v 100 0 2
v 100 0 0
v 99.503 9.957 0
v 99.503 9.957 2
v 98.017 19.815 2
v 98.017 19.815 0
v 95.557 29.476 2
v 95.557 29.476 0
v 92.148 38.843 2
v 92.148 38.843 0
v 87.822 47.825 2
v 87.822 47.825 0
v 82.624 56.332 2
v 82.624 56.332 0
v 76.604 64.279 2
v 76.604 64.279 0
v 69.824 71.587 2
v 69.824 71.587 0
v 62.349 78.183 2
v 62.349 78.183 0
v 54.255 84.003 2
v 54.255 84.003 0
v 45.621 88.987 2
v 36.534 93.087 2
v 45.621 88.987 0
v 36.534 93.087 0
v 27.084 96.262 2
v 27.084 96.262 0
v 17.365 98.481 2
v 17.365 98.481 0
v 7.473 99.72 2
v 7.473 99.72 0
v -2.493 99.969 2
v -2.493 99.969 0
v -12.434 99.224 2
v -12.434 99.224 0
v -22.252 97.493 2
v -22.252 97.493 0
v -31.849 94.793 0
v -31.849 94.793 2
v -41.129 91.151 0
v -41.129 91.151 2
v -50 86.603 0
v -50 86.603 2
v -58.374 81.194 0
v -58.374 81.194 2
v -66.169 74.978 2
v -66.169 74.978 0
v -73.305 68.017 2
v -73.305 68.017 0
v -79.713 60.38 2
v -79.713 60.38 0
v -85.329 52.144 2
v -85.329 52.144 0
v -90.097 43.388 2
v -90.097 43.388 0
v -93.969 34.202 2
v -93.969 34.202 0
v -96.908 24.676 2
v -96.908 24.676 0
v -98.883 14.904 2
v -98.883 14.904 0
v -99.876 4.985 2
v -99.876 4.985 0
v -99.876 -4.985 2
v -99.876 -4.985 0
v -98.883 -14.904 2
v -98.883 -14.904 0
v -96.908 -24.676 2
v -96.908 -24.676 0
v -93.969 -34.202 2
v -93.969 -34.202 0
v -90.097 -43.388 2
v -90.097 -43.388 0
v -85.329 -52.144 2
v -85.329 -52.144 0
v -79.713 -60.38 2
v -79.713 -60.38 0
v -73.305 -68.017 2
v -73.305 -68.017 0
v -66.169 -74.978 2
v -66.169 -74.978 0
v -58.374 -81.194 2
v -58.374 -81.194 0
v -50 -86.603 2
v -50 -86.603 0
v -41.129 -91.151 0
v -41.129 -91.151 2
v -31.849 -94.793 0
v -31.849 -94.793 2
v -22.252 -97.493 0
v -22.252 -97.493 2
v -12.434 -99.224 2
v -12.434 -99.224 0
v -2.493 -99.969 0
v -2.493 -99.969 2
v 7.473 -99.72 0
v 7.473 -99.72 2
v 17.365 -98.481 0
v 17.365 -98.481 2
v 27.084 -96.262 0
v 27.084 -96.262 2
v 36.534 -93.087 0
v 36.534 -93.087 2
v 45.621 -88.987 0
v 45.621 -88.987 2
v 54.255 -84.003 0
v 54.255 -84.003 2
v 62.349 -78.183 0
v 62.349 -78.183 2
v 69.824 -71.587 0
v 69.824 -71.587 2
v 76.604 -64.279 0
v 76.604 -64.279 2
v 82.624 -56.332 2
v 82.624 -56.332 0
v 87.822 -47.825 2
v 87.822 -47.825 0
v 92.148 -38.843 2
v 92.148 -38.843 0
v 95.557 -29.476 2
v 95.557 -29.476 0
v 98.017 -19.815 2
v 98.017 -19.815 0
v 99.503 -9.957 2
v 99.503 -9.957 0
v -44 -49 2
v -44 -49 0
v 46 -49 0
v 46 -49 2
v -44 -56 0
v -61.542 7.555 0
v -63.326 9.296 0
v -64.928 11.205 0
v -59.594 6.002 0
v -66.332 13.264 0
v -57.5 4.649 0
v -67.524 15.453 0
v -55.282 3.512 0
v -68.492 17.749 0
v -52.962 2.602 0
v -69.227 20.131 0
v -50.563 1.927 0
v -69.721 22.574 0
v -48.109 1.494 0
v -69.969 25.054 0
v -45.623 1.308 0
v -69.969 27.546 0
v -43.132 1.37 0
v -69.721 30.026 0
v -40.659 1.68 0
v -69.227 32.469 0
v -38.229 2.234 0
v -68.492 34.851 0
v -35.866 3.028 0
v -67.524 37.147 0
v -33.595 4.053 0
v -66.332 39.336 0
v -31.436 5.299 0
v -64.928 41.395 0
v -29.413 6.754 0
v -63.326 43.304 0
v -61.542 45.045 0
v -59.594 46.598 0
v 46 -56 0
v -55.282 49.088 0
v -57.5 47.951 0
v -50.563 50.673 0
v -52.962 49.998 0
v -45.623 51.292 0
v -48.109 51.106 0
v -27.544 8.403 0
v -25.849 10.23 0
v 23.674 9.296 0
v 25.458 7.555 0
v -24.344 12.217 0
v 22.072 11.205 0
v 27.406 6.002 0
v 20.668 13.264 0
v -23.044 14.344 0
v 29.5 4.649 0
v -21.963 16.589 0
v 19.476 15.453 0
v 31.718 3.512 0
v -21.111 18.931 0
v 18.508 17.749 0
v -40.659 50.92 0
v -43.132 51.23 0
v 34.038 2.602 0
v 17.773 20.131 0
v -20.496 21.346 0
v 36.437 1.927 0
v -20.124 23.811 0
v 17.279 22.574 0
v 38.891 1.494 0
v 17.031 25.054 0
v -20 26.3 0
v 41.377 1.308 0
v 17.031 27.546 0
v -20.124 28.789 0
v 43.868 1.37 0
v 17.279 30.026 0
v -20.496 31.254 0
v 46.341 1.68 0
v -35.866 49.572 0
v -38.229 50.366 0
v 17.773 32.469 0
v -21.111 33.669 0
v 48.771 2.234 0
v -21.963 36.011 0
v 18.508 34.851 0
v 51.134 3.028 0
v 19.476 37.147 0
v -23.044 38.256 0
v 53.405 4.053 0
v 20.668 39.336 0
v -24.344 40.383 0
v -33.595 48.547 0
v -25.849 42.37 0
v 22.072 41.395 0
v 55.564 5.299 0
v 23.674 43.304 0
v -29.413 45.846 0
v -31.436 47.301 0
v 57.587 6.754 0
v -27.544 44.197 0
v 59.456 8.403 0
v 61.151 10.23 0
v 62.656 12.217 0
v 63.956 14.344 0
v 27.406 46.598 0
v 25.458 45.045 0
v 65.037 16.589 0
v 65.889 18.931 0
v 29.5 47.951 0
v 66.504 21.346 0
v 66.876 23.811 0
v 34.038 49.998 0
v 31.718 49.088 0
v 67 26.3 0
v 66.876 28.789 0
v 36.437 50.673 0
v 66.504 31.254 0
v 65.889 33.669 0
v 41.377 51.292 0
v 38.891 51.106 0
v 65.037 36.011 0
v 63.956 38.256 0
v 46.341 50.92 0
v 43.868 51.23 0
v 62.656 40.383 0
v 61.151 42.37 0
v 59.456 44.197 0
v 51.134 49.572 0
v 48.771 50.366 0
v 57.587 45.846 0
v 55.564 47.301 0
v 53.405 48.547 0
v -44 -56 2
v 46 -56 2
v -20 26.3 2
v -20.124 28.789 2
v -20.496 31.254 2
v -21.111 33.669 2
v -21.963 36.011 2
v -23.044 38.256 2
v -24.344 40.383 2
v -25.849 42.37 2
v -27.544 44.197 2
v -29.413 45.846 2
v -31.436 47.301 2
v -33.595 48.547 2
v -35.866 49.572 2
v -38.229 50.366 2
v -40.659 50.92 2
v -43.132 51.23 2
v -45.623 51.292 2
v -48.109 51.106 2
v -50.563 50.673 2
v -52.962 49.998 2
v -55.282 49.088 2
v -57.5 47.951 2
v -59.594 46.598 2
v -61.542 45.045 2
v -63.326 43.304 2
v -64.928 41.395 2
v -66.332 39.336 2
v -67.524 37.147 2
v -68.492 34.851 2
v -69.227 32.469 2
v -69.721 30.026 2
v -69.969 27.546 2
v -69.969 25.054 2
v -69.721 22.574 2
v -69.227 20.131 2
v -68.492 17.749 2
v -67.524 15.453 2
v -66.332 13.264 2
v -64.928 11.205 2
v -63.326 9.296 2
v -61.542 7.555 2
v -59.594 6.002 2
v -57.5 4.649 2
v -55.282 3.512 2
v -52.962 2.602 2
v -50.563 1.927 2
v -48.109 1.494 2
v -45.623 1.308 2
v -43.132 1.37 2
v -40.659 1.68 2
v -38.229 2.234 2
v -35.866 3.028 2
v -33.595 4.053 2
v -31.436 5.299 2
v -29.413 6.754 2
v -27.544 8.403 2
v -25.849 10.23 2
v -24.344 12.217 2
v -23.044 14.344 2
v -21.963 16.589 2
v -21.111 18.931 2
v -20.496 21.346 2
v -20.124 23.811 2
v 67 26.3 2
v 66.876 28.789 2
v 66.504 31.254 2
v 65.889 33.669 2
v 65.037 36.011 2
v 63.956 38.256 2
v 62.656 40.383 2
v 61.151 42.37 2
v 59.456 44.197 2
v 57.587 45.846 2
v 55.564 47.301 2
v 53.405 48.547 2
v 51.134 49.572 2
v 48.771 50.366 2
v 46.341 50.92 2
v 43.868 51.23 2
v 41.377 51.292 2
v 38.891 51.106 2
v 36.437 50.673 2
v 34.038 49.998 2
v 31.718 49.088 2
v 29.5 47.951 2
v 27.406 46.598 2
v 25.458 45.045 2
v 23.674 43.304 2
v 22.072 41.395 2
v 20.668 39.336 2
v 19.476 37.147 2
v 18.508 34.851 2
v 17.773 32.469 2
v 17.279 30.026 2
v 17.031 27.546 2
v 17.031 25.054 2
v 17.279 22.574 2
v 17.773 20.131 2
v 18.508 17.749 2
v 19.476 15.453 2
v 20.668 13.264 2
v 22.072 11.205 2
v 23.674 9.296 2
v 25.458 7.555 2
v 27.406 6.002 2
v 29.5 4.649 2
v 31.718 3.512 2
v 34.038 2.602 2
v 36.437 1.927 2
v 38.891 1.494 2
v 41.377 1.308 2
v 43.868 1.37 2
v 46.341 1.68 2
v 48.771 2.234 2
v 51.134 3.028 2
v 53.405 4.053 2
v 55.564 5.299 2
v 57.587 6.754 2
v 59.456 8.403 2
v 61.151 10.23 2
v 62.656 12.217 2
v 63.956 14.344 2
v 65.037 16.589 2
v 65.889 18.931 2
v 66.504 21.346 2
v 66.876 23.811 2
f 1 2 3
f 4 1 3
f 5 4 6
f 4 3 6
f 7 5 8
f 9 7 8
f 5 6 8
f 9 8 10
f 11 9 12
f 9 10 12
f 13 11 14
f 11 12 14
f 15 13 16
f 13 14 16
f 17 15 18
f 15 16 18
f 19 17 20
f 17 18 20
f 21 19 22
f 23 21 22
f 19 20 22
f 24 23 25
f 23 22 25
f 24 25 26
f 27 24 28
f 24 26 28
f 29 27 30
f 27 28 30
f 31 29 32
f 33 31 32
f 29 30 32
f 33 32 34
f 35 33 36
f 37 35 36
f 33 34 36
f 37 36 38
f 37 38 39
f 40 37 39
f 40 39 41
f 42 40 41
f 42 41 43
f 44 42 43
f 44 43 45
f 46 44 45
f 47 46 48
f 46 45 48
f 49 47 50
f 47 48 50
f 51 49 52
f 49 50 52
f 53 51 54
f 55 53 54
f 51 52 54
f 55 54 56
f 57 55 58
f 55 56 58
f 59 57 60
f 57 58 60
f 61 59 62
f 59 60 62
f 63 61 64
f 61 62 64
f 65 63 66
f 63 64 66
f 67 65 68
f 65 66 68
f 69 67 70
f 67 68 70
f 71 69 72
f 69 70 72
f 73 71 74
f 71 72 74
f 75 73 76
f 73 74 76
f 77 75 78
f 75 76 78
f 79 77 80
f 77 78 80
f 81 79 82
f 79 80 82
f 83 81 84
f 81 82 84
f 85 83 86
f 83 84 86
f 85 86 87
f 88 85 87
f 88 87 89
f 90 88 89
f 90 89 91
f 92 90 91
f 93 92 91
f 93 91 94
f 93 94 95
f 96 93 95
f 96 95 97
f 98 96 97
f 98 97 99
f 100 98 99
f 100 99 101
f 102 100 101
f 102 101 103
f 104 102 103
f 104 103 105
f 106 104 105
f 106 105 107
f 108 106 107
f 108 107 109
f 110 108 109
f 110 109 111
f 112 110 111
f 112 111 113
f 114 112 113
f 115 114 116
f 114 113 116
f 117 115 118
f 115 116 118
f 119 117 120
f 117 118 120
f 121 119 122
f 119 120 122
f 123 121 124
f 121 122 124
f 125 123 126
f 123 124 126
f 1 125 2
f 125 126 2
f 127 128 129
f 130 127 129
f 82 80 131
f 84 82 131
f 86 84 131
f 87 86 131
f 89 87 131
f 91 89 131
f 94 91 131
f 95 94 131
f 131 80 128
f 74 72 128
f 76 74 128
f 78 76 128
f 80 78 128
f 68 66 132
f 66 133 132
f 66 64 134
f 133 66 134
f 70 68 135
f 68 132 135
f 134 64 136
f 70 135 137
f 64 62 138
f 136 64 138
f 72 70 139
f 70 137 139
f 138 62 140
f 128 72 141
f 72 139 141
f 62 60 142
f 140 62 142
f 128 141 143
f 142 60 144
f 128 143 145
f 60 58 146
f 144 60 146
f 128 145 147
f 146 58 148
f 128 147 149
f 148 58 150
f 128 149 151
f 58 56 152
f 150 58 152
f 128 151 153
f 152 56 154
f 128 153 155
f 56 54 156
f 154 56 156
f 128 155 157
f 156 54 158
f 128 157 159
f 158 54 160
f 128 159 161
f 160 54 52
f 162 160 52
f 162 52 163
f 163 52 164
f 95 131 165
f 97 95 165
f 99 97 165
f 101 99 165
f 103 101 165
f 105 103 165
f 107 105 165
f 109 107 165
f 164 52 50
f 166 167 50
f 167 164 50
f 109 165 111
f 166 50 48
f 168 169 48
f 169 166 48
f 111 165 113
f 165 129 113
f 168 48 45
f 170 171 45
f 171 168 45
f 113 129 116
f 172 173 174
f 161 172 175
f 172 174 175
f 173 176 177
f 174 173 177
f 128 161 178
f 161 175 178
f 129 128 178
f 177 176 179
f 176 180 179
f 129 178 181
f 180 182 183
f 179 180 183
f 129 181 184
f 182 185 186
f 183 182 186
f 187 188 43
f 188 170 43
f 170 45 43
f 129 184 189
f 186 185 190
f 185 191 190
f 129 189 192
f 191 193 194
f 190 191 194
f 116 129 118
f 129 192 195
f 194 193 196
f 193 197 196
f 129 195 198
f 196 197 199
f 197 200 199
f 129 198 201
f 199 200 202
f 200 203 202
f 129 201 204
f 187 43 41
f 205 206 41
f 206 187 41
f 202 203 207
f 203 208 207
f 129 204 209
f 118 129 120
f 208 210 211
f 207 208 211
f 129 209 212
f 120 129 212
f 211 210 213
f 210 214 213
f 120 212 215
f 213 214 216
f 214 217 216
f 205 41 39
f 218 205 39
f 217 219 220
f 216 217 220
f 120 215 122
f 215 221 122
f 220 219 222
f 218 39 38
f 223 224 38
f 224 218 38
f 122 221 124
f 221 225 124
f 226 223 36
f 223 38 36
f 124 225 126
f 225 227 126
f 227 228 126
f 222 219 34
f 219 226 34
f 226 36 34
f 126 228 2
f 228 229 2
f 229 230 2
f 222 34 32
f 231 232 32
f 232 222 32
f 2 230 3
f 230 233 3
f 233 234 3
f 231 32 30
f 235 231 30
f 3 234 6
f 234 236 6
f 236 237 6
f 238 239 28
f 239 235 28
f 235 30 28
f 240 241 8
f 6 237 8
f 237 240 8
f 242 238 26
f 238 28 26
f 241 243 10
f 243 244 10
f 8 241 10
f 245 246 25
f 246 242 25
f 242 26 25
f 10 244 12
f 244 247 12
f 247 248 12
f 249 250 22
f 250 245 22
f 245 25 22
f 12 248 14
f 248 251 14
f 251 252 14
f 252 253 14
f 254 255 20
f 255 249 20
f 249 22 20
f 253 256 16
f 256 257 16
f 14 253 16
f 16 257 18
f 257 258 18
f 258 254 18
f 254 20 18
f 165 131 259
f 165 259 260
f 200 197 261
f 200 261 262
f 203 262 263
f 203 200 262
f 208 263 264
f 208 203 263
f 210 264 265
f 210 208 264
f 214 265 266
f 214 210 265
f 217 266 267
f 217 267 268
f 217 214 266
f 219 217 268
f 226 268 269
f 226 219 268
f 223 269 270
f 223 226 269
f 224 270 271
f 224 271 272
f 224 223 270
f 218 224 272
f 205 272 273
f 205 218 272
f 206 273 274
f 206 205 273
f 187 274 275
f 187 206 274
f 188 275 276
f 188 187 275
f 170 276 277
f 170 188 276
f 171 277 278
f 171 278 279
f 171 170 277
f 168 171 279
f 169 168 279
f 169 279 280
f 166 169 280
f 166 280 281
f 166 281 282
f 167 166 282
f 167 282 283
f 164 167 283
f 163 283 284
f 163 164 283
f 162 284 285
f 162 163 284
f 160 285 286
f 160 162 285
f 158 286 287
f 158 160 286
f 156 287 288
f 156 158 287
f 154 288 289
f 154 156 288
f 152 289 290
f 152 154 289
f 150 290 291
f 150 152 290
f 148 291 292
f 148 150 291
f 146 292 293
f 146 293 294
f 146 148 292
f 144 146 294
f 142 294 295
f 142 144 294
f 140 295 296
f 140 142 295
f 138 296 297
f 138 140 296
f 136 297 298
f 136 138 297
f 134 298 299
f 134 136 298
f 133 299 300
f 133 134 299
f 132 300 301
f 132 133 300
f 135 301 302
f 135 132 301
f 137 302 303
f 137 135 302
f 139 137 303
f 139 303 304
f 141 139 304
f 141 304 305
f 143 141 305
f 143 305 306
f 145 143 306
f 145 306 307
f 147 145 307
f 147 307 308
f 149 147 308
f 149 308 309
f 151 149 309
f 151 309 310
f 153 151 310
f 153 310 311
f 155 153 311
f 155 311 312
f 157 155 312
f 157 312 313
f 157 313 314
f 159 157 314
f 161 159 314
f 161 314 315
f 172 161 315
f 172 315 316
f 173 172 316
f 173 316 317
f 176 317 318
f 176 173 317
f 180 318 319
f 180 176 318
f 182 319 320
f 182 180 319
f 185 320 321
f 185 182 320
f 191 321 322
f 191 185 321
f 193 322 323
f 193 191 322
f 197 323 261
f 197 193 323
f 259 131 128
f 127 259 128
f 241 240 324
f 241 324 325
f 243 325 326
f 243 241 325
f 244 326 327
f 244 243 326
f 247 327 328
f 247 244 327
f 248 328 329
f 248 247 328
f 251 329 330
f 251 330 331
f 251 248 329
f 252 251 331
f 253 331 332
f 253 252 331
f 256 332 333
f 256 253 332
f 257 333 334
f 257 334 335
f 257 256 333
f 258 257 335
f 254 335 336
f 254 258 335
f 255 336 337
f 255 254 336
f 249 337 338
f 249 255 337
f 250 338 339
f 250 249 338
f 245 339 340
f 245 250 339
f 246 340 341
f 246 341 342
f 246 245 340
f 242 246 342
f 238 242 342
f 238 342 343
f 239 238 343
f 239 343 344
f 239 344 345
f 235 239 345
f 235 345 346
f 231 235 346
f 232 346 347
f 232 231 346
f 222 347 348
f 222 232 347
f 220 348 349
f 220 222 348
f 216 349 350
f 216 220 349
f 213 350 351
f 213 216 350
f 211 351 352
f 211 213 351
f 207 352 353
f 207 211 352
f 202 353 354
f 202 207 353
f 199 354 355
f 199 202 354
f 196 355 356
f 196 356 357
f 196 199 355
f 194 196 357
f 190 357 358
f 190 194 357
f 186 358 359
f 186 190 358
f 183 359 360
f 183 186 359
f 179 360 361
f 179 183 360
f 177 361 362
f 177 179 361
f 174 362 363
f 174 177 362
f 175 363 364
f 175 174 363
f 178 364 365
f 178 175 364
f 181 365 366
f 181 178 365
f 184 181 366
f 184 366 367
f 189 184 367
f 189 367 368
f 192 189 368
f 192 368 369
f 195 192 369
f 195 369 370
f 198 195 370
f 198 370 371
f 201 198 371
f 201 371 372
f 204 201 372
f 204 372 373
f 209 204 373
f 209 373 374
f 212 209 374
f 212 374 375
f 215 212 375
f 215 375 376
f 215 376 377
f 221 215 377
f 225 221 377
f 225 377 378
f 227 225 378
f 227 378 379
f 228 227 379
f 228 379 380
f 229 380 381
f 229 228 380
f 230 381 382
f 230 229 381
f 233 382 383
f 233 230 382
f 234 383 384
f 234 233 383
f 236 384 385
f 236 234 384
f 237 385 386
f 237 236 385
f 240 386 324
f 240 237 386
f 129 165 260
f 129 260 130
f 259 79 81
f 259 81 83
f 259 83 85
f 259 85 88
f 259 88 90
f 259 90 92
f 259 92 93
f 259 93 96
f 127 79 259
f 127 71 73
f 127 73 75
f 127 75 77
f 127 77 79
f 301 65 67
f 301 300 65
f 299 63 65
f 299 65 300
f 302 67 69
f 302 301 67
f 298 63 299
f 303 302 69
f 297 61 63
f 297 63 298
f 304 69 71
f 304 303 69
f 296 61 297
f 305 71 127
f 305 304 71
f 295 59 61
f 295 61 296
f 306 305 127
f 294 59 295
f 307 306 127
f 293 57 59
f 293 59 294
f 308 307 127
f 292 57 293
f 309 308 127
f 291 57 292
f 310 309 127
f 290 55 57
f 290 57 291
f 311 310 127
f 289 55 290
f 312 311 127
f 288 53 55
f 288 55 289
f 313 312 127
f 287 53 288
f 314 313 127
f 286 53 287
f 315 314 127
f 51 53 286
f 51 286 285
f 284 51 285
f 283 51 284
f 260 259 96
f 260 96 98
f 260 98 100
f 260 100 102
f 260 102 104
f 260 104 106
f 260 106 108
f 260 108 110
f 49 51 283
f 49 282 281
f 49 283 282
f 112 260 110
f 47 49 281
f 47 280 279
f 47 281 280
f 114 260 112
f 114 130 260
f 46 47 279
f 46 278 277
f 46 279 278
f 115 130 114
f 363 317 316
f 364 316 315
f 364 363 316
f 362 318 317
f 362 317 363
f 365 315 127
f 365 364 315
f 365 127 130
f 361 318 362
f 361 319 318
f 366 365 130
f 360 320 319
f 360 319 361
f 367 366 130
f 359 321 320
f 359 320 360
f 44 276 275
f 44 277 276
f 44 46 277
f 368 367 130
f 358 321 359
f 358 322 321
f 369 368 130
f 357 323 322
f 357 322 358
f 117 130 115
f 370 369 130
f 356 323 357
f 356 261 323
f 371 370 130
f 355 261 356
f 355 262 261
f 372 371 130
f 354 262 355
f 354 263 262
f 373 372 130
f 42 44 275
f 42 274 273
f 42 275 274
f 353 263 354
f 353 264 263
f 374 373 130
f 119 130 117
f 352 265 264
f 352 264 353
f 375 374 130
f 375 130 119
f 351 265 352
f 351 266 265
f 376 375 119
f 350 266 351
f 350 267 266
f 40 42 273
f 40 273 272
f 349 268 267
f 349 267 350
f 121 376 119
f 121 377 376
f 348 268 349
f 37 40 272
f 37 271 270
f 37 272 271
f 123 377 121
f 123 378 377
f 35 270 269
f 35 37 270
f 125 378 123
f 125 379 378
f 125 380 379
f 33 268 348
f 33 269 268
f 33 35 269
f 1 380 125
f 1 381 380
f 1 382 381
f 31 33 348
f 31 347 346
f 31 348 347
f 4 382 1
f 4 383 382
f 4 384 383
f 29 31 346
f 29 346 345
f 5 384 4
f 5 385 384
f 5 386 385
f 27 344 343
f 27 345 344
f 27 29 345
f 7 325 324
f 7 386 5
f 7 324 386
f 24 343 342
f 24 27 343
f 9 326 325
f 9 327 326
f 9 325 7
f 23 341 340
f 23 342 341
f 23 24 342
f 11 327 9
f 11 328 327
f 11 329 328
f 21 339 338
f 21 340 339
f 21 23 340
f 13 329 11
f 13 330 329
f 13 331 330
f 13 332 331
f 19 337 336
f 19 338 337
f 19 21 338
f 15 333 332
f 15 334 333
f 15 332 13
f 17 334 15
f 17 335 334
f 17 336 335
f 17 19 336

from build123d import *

# Parameters (mm, degrees)
CYLINDER002_R     = 25
CYLINDER002_DEPTH = 2
CYLINDER001_R     = 25
CYLINDER001_DEPTH = 2
BOX_W             = 90
BOX_H             = 7
BOX_DEPTH         = 2
CYLINDER_R        = 100
CYLINDER_DEPTH    = 2


with BuildPart() as cylinder002:
    # Cylinder002 → Cylinder002 (new body)
    with BuildSketch(Plane(origin=(42, 26.3, 0), x_dir=(1, 0, 0), z_dir=(0, 0, 1))):
        Circle(CYLINDER002_R)
    extrude(amount=CYLINDER002_DEPTH)


with BuildPart() as cylinder001:
    # Cylinder001 → Cylinder001 (new body)
    with BuildSketch(Plane(origin=(-45, 26.3, 0), x_dir=(1, 0, 0), z_dir=(0, 0, 1))):
        Circle(CYLINDER001_R)
    extrude(amount=CYLINDER001_DEPTH)


with BuildPart() as cube:
    # Box → Box (new body)
    with BuildSketch(Plane(origin=(-44, -56, 0), x_dir=(1, 0, 0), z_dir=(0, 0, 1))):
        with Locations((45, 3.5)):
            Rectangle(BOX_W, BOX_H)
    extrude(amount=BOX_DEPTH)


with BuildPart() as cut002:
    # Cylinder → Cylinder (new body)
    with BuildSketch(Plane.XY):
        Circle(CYLINDER_R)
    extrude(amount=CYLINDER_DEPTH)

    # Cut: cut Cube
    add(cube.part, mode=Mode.SUBTRACT)

    # Cut001: cut Cylinder001
    add(cylinder001.part, mode=Mode.SUBTRACT)

    # Cut002: cut Cylinder002
    add(cylinder002.part, mode=Mode.SUBTRACT)


solid = cut002.part
